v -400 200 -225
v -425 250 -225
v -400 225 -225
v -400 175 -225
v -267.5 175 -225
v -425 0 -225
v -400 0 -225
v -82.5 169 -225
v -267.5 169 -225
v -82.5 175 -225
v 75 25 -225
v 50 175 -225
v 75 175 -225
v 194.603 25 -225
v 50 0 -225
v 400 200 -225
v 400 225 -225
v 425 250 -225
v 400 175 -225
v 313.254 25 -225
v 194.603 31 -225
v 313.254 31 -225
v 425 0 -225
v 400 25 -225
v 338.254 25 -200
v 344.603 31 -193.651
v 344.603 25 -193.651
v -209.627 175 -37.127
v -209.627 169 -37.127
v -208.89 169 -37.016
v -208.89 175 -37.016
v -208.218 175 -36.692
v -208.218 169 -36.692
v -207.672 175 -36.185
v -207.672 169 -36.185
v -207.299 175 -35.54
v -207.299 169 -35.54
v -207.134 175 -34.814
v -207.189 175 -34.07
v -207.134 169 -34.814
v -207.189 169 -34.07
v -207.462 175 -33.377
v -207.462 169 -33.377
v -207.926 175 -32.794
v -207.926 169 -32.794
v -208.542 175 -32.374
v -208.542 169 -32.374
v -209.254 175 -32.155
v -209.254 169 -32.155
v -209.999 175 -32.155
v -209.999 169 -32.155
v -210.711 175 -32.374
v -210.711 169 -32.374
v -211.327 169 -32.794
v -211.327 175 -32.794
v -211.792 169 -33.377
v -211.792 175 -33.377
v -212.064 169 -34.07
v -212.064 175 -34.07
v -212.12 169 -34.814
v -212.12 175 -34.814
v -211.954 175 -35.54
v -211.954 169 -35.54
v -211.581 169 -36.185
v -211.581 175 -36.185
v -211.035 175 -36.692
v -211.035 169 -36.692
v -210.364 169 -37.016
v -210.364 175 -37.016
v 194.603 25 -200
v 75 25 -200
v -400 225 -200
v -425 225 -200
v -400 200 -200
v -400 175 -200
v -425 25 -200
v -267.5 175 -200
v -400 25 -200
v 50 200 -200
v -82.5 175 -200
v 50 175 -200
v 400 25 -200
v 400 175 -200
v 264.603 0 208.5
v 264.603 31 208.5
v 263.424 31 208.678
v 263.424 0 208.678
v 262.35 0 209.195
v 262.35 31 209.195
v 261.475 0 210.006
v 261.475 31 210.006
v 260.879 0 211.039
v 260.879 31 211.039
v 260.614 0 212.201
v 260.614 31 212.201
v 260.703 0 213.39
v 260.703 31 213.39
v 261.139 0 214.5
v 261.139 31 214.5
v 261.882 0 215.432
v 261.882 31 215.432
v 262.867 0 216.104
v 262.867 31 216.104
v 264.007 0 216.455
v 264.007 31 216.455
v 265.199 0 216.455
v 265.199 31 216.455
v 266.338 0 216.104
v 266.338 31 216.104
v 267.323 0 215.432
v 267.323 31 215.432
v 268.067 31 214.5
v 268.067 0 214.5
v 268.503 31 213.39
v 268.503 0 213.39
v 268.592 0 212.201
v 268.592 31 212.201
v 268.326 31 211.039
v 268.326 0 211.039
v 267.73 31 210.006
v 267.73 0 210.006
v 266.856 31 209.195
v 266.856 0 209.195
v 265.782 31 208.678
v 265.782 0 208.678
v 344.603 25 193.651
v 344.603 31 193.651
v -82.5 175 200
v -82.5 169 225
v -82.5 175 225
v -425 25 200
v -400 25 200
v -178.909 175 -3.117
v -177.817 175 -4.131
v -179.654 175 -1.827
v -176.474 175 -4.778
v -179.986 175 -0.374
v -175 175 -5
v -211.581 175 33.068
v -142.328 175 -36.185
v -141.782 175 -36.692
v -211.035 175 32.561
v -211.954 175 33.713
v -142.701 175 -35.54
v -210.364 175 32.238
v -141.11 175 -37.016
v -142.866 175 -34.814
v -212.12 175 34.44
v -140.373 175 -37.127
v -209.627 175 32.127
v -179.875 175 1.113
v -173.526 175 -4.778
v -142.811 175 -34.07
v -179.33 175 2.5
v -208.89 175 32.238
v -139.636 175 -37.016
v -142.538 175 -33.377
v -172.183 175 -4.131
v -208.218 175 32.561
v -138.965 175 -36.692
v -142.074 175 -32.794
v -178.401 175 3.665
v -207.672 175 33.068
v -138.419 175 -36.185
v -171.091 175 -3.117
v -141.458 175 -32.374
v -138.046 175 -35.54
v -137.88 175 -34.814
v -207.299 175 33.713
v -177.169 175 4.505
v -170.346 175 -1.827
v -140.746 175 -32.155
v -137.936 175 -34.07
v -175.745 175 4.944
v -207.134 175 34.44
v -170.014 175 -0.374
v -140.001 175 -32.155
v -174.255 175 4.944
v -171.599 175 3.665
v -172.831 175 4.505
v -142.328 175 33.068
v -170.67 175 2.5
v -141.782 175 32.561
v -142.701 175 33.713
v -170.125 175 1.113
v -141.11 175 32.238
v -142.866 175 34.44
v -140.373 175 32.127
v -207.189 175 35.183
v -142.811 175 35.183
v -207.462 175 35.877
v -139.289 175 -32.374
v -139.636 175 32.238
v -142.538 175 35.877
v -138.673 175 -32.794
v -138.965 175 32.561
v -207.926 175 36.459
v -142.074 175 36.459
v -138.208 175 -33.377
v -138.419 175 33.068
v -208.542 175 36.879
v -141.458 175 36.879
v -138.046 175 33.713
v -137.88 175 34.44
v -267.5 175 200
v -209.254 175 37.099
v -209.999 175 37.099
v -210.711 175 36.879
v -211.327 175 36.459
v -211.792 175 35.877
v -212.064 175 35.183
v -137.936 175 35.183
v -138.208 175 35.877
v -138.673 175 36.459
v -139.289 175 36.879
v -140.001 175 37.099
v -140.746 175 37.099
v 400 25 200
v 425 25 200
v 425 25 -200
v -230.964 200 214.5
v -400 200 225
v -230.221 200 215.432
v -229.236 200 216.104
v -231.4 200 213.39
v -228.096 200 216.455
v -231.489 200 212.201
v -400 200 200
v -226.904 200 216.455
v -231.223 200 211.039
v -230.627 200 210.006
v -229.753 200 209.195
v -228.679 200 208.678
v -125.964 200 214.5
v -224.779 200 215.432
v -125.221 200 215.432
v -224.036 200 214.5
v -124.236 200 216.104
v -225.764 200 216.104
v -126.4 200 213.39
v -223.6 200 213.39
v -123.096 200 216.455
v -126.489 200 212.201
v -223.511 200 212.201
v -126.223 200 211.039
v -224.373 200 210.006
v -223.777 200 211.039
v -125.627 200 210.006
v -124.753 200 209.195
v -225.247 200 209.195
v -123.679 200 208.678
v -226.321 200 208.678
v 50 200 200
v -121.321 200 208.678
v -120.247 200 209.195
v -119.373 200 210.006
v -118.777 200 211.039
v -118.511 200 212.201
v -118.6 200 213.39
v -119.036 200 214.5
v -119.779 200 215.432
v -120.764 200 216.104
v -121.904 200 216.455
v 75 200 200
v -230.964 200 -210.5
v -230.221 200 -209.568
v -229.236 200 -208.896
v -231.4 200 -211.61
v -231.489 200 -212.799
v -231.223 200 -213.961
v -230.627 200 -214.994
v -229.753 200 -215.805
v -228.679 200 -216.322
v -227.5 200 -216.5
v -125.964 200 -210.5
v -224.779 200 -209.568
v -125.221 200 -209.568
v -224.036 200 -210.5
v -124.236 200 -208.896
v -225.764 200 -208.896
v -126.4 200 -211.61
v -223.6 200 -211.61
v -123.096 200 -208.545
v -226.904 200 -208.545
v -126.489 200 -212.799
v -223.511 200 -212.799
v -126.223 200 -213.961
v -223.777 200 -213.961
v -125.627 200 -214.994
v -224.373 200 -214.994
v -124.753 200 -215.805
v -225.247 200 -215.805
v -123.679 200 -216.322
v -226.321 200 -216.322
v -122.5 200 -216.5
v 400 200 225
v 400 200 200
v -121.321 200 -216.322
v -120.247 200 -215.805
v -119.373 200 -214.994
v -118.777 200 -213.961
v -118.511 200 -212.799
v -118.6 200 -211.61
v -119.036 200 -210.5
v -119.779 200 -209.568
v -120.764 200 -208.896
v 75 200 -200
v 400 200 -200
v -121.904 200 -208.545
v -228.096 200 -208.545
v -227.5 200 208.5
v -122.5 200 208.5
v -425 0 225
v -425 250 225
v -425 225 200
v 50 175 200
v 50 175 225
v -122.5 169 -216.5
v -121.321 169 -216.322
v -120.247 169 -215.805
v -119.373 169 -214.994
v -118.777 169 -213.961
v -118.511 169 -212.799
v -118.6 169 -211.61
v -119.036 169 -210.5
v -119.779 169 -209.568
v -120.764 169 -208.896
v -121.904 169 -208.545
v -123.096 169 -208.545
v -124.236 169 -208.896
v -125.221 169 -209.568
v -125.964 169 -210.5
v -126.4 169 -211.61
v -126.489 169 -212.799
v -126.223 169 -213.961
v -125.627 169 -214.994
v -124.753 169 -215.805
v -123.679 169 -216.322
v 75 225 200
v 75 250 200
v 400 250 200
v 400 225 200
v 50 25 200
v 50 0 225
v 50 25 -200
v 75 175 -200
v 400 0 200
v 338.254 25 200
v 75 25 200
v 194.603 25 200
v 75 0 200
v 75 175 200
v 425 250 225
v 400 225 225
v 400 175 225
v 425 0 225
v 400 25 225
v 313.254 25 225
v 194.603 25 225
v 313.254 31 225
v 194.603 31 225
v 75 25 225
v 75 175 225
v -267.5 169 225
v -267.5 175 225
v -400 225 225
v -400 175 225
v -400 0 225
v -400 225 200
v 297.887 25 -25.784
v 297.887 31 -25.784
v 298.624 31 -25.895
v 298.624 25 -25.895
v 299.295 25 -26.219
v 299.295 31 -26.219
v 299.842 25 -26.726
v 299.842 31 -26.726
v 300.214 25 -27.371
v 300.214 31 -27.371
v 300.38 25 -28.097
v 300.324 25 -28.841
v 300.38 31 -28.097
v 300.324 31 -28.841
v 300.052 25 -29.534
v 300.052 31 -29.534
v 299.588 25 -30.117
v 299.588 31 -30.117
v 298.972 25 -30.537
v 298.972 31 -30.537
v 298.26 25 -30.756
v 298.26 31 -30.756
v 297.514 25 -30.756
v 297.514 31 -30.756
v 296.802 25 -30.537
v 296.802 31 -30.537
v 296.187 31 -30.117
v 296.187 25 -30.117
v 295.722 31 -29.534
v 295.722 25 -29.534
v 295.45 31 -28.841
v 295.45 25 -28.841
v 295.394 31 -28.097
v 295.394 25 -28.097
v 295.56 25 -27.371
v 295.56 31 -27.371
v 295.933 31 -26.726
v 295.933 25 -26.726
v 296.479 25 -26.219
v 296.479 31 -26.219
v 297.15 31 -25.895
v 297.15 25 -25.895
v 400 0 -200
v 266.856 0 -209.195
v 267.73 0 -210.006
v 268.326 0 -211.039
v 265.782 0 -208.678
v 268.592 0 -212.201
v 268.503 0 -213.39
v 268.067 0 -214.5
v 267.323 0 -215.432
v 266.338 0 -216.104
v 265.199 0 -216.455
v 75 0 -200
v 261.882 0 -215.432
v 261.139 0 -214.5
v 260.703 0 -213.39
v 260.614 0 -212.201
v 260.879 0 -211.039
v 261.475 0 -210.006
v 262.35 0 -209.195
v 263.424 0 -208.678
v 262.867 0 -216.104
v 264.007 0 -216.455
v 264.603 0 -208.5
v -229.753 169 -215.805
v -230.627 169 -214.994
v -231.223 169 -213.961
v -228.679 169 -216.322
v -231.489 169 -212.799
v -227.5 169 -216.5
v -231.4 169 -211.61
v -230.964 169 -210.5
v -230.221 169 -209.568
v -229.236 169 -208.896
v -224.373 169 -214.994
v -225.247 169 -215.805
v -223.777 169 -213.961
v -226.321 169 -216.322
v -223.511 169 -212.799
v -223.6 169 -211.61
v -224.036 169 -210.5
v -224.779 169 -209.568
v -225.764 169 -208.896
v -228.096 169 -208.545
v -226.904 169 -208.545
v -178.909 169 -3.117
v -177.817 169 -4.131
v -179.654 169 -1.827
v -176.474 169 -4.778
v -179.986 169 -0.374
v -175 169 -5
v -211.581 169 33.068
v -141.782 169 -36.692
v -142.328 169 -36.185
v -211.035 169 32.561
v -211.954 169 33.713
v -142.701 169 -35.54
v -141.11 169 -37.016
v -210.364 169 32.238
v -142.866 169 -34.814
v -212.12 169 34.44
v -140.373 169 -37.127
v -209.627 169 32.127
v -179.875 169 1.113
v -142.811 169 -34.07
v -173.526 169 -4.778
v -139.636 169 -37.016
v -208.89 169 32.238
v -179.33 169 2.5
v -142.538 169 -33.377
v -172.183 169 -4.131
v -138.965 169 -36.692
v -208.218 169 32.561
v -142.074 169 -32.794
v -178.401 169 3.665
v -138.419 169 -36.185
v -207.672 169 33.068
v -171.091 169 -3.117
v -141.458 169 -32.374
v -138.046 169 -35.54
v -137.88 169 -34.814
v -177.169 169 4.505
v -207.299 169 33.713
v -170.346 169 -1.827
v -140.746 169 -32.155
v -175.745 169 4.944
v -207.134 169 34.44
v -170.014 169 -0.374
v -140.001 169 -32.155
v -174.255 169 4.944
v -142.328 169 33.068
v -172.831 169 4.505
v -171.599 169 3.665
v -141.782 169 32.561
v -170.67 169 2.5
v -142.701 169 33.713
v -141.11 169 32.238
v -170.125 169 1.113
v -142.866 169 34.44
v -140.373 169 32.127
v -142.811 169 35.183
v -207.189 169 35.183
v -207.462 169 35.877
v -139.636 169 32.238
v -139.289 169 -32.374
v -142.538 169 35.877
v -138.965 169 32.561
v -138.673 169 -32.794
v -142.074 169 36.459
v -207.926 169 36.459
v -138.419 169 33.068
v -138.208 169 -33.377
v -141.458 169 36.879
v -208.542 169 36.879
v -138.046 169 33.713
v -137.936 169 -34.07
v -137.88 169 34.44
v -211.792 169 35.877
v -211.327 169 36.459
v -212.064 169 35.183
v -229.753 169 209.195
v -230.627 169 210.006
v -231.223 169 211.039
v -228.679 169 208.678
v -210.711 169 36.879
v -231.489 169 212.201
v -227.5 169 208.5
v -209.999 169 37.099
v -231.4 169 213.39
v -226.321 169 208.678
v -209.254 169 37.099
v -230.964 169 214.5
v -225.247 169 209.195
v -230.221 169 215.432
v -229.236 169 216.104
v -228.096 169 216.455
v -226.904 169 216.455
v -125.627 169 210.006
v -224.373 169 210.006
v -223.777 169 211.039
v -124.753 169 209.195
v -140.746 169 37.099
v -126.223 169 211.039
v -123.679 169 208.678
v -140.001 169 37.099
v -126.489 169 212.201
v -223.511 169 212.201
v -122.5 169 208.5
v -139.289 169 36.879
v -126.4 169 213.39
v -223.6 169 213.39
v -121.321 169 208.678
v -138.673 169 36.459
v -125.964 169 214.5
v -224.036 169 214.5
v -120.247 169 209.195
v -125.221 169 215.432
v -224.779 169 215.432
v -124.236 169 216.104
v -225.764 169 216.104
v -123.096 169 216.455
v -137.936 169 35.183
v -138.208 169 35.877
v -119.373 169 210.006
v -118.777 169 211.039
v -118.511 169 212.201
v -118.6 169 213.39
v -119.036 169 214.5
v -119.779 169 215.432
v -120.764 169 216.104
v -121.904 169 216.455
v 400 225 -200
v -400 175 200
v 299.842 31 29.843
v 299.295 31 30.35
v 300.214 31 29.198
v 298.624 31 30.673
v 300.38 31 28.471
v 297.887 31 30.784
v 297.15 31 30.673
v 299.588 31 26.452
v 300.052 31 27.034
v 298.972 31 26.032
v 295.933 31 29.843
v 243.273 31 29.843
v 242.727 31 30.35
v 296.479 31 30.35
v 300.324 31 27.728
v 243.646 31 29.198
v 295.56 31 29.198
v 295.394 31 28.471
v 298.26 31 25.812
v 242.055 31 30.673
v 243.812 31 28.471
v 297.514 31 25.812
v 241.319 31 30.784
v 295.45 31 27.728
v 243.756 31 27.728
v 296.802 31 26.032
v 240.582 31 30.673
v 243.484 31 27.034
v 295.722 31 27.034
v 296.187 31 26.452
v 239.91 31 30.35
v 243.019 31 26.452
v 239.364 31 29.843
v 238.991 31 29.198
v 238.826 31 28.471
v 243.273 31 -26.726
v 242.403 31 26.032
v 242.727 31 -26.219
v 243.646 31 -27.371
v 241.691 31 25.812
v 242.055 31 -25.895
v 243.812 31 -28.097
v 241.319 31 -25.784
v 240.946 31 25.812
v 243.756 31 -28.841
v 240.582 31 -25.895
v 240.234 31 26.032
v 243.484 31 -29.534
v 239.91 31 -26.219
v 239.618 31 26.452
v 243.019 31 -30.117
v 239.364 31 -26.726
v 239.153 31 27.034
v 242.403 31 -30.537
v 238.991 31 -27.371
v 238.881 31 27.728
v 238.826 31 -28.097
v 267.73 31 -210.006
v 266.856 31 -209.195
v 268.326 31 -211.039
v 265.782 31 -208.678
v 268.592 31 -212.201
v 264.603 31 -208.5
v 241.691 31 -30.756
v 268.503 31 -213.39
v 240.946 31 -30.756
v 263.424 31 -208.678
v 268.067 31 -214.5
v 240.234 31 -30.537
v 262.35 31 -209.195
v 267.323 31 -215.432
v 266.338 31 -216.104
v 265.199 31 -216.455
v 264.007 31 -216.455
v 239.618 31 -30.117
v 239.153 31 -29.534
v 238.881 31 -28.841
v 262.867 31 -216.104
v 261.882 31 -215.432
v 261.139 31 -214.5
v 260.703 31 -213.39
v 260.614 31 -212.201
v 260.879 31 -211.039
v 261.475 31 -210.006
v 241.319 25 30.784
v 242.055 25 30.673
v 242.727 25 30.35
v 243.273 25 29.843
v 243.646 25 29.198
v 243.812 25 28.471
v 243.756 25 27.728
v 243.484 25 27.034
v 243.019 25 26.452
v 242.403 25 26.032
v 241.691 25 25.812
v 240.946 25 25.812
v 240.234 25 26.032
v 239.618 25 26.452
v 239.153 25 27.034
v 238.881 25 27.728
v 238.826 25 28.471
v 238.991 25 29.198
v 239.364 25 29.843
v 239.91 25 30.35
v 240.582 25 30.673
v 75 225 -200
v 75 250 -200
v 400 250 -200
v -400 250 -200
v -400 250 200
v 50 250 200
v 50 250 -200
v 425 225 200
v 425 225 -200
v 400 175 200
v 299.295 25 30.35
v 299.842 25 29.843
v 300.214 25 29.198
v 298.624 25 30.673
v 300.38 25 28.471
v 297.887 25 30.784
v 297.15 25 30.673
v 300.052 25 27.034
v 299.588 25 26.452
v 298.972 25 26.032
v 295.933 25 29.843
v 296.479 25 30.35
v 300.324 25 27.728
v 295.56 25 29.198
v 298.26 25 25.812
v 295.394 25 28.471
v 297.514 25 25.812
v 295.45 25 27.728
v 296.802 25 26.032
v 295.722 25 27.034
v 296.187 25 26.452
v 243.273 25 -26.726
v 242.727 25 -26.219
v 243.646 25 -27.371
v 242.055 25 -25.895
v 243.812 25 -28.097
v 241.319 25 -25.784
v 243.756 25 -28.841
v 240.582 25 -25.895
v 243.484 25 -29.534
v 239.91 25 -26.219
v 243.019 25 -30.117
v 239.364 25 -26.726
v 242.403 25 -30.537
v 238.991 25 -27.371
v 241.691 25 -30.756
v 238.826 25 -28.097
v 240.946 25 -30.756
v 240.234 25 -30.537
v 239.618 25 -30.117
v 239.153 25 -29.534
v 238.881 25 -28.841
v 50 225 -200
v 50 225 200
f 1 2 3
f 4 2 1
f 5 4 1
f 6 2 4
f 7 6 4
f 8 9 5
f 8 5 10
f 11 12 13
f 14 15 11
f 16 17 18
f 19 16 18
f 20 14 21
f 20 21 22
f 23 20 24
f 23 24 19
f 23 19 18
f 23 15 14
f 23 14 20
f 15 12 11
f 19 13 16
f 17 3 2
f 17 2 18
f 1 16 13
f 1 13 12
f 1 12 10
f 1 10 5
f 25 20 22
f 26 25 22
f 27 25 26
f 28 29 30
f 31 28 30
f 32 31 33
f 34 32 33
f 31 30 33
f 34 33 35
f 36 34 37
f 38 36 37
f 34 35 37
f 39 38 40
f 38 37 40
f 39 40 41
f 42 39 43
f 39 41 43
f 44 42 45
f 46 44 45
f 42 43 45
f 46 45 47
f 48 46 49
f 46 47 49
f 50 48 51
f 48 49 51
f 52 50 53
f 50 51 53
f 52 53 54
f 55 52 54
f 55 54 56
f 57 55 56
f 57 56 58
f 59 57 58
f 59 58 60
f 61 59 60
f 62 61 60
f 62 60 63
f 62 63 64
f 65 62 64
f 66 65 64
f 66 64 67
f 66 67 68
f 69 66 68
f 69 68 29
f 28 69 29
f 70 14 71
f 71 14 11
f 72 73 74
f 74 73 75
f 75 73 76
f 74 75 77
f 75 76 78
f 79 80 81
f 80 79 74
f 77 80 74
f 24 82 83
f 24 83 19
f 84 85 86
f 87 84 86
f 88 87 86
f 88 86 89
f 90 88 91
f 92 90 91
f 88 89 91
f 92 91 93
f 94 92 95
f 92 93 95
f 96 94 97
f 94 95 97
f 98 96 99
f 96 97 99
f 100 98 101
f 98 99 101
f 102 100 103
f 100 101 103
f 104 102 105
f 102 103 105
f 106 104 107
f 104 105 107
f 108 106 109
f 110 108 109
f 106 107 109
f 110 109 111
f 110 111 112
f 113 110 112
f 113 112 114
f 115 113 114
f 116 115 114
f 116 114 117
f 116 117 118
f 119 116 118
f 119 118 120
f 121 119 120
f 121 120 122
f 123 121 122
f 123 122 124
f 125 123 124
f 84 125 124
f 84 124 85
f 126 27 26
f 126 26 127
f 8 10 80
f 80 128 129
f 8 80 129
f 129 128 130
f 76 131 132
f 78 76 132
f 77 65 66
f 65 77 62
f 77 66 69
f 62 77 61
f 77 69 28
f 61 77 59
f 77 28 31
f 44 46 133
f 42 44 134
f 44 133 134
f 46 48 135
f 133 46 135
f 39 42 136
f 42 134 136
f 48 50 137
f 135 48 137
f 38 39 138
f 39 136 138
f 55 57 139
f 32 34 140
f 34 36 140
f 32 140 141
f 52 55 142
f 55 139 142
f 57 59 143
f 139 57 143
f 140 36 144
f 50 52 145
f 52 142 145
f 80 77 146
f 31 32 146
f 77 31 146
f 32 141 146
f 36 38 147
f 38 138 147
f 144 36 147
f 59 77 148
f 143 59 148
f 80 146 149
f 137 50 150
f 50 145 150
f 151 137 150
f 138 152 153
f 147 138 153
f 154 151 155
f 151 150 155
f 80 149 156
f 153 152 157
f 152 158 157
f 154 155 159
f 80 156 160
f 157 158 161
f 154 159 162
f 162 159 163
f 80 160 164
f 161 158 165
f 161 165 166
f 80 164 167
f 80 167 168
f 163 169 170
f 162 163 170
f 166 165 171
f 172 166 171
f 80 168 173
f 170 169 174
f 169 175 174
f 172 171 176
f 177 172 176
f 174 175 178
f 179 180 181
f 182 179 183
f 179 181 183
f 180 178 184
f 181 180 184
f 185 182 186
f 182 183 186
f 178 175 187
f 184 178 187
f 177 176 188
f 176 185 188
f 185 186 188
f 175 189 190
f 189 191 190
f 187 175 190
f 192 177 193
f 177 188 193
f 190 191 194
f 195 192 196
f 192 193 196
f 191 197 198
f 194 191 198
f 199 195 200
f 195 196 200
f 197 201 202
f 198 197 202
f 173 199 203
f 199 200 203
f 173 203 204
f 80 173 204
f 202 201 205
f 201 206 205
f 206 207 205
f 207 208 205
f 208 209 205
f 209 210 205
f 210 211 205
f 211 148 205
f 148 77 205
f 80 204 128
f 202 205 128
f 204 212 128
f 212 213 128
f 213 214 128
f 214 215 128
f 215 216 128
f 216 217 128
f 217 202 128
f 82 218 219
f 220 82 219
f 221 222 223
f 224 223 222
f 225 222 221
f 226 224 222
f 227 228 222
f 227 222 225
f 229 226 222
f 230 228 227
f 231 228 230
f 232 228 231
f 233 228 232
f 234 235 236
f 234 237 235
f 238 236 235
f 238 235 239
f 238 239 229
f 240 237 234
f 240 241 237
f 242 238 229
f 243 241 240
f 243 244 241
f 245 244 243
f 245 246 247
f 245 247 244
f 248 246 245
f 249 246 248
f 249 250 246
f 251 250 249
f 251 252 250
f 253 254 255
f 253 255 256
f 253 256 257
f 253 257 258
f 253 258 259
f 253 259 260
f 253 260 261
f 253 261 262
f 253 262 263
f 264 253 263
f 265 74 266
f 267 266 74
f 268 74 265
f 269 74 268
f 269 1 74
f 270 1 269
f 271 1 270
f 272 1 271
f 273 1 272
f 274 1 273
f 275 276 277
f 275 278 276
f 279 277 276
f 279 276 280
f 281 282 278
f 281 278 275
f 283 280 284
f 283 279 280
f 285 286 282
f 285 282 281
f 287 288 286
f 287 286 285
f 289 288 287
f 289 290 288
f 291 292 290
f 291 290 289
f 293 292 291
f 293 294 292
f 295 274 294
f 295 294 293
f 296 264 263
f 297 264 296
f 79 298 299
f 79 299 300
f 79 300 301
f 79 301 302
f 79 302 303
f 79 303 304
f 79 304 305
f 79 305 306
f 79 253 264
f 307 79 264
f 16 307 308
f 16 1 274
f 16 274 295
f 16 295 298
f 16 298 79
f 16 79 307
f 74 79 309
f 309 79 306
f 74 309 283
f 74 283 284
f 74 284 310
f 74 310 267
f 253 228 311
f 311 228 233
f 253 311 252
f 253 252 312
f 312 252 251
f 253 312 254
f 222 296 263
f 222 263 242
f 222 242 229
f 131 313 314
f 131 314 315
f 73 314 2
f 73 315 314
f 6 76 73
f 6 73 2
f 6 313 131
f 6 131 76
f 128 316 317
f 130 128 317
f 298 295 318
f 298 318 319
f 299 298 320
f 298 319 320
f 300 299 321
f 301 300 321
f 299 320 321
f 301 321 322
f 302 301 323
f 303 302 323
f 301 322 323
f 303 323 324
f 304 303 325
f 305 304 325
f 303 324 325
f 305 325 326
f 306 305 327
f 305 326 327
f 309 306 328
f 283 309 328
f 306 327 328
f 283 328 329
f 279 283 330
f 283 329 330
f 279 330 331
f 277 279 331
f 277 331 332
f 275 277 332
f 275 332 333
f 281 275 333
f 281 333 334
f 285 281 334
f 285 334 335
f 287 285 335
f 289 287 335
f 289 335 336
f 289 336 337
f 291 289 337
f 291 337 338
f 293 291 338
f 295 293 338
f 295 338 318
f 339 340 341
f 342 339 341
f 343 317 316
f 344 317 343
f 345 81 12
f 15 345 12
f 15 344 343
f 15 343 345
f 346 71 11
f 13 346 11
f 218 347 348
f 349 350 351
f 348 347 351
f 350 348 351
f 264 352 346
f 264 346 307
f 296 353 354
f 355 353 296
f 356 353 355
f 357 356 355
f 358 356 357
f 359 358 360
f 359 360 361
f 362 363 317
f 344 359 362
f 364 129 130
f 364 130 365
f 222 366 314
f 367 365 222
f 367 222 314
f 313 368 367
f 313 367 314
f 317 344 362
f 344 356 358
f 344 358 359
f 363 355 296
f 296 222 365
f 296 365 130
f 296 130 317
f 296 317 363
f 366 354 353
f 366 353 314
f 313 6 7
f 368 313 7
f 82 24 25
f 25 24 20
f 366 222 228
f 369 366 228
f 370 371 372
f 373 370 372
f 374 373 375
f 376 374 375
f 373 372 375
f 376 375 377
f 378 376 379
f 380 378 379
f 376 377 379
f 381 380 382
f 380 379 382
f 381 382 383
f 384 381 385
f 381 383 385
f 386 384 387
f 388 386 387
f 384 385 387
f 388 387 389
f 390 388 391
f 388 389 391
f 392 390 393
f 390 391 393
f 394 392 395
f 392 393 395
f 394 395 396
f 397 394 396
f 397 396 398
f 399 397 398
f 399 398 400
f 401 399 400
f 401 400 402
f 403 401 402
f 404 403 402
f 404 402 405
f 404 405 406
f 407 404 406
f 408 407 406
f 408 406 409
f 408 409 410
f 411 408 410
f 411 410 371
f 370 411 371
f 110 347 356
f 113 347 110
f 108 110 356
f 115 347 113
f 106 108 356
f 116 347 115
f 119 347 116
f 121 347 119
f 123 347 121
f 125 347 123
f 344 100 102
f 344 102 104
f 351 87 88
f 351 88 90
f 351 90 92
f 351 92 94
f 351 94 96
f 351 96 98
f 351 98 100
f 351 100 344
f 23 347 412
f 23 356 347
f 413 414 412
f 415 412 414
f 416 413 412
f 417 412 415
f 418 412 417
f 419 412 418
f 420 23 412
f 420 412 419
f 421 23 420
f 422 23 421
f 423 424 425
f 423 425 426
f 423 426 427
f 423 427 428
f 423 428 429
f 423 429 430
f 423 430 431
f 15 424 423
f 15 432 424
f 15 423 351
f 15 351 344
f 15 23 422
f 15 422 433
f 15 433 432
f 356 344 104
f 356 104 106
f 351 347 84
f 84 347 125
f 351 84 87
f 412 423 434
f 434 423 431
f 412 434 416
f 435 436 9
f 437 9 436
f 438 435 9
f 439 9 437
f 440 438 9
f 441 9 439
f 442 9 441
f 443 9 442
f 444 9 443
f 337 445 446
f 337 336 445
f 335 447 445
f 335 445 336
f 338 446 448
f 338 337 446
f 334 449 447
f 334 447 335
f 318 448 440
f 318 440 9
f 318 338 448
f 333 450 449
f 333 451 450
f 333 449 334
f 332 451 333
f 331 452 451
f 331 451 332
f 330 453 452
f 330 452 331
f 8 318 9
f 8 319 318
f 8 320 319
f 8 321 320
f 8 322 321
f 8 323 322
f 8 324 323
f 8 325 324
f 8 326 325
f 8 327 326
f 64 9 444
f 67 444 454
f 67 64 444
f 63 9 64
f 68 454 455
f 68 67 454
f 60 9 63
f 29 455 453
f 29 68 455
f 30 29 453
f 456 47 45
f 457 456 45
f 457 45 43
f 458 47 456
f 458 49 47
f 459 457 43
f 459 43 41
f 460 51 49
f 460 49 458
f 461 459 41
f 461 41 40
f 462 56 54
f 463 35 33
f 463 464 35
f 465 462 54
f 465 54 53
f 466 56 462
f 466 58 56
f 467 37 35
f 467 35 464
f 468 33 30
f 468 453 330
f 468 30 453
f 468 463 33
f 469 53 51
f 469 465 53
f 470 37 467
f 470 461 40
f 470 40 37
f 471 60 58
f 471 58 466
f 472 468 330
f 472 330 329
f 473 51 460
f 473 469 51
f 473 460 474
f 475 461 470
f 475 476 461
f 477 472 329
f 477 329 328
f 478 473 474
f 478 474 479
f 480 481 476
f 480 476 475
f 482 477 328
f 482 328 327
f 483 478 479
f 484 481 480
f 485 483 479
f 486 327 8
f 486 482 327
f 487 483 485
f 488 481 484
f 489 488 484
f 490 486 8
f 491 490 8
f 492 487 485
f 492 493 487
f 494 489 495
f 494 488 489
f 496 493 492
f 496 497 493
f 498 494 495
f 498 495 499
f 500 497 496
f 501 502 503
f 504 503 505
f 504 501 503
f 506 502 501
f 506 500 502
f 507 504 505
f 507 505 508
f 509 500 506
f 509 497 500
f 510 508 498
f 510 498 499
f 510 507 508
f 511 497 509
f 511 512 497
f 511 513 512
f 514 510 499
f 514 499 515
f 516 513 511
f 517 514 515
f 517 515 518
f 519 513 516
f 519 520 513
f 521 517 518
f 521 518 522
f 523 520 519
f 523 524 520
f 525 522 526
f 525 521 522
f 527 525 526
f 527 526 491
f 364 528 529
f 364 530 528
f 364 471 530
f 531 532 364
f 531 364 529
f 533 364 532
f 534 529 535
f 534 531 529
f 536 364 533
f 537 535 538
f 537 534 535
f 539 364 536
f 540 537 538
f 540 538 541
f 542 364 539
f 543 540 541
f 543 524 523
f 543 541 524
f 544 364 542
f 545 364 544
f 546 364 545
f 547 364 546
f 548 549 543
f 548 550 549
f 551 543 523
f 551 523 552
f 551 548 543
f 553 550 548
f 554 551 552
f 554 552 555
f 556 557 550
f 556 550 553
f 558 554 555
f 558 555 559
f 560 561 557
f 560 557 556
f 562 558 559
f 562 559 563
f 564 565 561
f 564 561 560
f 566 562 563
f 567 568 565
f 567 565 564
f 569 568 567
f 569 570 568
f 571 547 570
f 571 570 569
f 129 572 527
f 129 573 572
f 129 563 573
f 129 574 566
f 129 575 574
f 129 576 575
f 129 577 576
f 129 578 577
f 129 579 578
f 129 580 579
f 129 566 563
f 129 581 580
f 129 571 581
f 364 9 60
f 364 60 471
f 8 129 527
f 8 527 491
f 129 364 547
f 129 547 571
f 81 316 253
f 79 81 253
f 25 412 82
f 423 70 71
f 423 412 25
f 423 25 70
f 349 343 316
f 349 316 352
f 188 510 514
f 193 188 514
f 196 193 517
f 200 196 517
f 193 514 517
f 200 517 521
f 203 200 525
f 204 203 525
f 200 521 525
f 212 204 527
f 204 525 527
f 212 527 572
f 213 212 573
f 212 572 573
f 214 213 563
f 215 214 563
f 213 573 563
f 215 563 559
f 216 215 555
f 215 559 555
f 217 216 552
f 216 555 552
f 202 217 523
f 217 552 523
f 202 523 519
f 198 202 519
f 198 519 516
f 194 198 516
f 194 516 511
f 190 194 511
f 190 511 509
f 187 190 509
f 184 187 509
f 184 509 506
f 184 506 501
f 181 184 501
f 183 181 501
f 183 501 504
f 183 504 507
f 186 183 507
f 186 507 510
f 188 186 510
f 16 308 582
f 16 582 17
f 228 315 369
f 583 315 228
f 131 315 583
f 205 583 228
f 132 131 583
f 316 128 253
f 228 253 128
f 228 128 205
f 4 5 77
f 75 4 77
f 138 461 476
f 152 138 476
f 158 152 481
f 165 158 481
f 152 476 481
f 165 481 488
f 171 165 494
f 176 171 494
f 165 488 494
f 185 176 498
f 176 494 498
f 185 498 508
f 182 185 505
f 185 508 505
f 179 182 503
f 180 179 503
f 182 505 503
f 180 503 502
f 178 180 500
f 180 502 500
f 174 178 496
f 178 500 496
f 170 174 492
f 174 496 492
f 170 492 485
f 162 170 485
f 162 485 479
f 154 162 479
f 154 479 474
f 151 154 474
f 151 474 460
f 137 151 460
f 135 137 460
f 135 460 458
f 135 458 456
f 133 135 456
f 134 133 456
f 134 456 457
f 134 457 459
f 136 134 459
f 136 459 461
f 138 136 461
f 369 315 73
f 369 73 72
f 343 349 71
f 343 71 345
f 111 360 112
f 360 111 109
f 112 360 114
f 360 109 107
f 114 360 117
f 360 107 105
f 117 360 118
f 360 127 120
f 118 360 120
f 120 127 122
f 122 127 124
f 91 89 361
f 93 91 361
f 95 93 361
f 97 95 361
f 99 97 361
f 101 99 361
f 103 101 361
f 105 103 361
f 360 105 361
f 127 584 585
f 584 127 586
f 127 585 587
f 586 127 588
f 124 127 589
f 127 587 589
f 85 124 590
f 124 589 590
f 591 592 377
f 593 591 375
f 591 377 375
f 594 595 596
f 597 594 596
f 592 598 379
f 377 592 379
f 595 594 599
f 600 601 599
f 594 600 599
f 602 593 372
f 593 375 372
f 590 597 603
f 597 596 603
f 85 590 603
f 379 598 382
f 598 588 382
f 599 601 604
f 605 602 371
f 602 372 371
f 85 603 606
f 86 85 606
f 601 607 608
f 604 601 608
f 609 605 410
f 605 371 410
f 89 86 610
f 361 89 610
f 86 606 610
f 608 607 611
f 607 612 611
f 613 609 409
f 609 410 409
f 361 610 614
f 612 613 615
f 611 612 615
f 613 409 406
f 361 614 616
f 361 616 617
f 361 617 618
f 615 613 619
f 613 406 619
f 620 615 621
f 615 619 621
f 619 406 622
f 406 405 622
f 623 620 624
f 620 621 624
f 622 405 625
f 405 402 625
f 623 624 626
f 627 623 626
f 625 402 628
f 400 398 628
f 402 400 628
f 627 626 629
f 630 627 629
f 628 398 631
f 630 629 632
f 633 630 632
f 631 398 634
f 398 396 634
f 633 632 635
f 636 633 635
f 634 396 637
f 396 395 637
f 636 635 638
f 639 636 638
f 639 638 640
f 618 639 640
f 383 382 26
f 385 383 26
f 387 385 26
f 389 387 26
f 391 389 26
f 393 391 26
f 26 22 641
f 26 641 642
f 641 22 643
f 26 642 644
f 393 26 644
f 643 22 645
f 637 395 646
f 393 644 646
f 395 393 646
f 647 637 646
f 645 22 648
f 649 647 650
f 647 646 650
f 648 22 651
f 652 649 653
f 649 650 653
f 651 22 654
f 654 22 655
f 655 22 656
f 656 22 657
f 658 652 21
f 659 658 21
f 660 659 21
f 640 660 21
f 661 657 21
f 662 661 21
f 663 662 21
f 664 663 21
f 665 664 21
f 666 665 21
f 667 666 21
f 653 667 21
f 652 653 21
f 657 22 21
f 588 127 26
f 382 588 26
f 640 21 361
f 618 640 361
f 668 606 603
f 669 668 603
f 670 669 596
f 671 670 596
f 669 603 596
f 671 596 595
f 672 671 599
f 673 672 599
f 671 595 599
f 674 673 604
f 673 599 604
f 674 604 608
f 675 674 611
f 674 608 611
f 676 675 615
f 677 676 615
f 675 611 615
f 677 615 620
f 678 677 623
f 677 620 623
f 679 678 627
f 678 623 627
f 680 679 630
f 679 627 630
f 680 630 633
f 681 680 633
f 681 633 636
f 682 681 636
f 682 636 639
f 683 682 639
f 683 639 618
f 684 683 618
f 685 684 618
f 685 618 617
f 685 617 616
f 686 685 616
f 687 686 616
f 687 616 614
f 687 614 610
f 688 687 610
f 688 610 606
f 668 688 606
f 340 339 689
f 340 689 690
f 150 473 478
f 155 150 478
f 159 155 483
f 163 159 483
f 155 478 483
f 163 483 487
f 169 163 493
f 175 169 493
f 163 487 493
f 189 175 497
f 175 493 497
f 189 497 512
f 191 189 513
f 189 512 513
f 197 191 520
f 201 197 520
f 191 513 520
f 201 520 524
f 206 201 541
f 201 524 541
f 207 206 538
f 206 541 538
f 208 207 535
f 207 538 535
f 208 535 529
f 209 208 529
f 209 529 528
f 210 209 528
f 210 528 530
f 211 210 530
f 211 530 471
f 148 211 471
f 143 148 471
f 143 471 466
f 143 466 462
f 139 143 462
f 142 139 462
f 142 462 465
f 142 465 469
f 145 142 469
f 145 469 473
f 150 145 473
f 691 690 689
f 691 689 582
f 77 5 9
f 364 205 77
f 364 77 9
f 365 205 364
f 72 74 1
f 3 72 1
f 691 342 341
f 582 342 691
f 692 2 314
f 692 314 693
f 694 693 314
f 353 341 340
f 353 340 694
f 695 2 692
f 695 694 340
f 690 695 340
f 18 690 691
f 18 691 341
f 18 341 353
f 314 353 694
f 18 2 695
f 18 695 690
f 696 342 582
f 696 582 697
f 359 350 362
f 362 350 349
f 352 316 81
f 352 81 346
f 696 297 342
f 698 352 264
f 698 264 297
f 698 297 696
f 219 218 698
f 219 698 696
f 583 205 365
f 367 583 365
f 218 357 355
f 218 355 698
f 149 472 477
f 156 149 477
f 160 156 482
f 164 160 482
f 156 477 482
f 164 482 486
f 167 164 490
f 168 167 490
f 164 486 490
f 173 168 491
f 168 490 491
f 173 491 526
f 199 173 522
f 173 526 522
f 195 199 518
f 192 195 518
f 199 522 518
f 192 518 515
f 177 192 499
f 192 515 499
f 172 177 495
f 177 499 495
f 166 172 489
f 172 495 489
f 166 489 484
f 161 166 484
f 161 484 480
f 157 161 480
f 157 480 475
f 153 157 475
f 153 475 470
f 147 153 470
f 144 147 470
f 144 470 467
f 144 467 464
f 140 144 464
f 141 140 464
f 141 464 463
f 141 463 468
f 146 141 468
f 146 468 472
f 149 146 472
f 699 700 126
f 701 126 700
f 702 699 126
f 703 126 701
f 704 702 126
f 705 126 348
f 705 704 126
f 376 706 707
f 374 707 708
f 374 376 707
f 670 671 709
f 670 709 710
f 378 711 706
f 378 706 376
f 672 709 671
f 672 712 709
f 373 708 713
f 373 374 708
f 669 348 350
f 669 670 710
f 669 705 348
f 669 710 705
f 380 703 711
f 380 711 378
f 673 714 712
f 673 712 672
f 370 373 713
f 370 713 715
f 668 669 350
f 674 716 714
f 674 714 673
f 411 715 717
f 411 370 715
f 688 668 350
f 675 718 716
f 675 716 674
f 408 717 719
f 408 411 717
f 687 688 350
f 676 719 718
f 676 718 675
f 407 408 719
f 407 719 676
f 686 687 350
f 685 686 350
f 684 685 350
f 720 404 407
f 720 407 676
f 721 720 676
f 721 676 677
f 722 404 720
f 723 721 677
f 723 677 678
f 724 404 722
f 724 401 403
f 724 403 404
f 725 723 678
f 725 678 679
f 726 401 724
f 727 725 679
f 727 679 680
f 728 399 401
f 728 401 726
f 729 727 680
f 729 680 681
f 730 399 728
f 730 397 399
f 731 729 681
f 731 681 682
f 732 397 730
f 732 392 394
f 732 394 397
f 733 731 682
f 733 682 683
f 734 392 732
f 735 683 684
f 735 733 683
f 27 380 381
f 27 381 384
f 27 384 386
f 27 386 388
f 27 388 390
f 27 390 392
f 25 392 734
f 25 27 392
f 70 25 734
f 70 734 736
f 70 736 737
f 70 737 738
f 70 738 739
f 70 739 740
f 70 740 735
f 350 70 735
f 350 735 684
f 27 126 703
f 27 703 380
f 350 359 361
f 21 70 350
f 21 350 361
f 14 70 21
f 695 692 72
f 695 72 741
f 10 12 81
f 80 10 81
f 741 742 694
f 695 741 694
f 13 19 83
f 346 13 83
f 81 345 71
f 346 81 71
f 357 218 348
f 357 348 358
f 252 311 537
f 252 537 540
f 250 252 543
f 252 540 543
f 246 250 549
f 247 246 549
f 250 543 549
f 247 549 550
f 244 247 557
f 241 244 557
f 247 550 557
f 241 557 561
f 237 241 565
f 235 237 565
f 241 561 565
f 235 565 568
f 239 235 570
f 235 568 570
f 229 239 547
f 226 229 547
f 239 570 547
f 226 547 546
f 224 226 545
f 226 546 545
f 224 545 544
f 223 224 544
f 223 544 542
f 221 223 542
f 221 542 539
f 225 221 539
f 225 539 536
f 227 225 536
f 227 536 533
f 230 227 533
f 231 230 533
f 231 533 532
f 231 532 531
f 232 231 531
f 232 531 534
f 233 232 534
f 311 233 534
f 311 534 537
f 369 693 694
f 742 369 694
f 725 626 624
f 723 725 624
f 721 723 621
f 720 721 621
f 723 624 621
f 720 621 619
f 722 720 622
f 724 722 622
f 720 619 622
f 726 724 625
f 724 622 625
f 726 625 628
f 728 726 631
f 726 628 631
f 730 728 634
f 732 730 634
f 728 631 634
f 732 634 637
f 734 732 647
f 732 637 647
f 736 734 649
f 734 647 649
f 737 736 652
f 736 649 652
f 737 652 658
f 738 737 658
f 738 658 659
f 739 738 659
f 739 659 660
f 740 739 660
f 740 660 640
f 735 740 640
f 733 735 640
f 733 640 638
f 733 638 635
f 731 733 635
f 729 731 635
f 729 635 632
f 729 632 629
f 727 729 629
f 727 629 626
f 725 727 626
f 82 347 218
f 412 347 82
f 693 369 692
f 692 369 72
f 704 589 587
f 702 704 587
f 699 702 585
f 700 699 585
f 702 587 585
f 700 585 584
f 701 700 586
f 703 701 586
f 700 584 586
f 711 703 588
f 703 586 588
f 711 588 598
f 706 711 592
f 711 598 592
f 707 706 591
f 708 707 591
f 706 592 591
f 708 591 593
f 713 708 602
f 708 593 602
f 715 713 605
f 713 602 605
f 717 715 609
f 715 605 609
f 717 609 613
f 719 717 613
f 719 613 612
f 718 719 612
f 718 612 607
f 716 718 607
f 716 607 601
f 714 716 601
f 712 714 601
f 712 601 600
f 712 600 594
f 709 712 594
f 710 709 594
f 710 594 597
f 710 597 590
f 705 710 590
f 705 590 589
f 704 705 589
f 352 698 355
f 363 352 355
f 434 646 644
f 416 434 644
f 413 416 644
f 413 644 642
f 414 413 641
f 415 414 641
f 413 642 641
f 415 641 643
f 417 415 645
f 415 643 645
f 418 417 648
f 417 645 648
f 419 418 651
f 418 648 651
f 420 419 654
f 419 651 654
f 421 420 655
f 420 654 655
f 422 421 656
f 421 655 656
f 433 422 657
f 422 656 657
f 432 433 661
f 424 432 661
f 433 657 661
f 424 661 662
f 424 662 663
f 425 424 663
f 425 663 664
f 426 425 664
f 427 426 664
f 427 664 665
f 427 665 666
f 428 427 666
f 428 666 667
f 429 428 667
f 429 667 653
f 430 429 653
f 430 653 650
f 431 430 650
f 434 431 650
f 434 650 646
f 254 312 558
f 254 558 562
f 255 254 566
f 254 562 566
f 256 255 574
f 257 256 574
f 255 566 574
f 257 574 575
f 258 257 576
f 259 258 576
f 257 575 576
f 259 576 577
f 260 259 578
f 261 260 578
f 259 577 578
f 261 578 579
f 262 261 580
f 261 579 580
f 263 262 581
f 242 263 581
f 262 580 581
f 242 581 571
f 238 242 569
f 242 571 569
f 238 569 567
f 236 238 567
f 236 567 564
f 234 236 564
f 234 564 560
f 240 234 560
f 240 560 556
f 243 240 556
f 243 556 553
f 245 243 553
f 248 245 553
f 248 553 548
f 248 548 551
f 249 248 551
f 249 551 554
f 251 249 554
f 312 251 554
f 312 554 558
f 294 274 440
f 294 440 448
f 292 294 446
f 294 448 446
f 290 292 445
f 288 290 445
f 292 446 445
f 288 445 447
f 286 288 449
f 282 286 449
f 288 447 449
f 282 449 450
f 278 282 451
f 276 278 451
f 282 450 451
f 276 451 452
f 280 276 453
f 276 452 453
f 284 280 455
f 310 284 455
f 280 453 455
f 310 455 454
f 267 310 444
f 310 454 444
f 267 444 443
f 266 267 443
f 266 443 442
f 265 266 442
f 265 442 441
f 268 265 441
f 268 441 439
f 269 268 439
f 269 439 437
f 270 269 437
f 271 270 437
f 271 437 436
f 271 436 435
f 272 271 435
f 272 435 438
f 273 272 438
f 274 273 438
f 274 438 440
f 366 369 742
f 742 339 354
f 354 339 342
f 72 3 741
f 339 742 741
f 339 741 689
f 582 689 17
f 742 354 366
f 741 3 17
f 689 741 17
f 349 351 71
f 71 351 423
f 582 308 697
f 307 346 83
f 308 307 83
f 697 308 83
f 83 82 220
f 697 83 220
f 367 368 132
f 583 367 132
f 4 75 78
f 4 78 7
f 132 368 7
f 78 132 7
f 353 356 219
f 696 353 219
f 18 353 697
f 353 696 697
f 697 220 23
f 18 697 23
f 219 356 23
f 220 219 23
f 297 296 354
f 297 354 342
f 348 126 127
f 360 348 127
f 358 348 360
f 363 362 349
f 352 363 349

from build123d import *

# Parameters (mm, degrees)
SKETCH1_W             = 25
SKETCH1_H             = 450
BOSS_EXTRUDE2_DEPTH   = 25
BOSS_EXTRUDE2_2_DEPTH = 25
SKETCH2_W             = 25
SKETCH2_H             = 25
BOSS_EXTRUDE3_DEPTH   = 200
SKETCH3_W             = 25
SKETCH3_H             = 450
BOSS_EXTRUDE4_DEPTH   = 25
SKETCH5_W             = 25
SKETCH5_H             = 25
BOSS_EXTRUDE5_DEPTH   = 200
SKETCH6_W             = 25
SKETCH6_H             = 450
BOSS_EXTRUDE6_DEPTH   = 25
SKETCH7_W             = 800
SKETCH7_H             = 25
BOSS_EXTRUDE7_DEPTH   = 25
SKETCH8_W             = 350
SKETCH8_H             = 25
BOSS_EXTRUDE8_DEPTH   = 25
SKETCH9_W             = 25
SKETCH9_H             = 425
BOSS_EXTRUDE9_DEPTH   = 25
SKETCH10_W            = 25
SKETCH10_H            = 25
BOSS_EXTRUDE10_DEPTH  = 800
BOSS_EXTRUDE13_REACH  = 532.919
SKETCH14_W            = 25
SKETCH14_H            = 25
SKETCH15_W            = 185
SKETCH15_H            = 450
BOSS_EXTRUDE14_DEPTH  = 6
BOSS_EXTRUDE15_DEPTH  = 6
CUT_EXTRUDE2_REACH    = 511.717
SKETCH19_R            = 4
CUT_EXTRUDE4_REACH    = 530.404
SKETCH20_R            = 4
SKETCH21_R            = 5
SKETCH21_R_2          = 2.5
CUT_EXTRUDE5_DEPTH    = 10
BOSS_EXTRUDE16_REACH  = 652.961
SKETCH24_W            = 25
SKETCH24_H            = 25
SKETCH25_R            = 2.5
CUT_EXTRUDE6_DEPTH    = 10


with BuildPart() as part:
    # Sketch1 → Boss-Extrude2 (new body)
    with BuildSketch(Plane(origin=(0, 0, 0), x_dir=(1, 0, 0), z_dir=(0, 1, 0))):
        with Locations((-412.5, 0)):
            Rectangle(SKETCH1_W, SKETCH1_H)
    extrude(amount=BOSS_EXTRUDE2_DEPTH)

    # Sketch2 → Boss-Extrude3 (add)
    with BuildSketch(Plane(origin=(0, 25, 0), x_dir=(1, 0, 0), z_dir=(0, 1, 0))):
        with Locations((-412.5, 212.5)):
            Rectangle(SKETCH2_W, SKETCH2_H)
        with Locations((-412.5, -212.5)):
            Rectangle(SKETCH2_W, SKETCH2_H)
    extrude(amount=BOSS_EXTRUDE3_DEPTH)

    # Sketch3 → Boss-Extrude4 (add)
    with BuildSketch(Plane(origin=(0, 225, 0), x_dir=(1, 0, 0), z_dir=(0, 1, 0))):
        with Locations((-412.5, 0)):
            Rectangle(SKETCH3_W, SKETCH3_H)
    extrude(amount=BOSS_EXTRUDE4_DEPTH)



with BuildPart() as body_2:
    # Sketch1 → Boss-Extrude2 2 (new body)
    with BuildSketch(Plane(origin=(0, 0, 0), x_dir=(1, 0, 0), z_dir=(0, 1, 0))):
        with Locations((412.5, 0)):
            Rectangle(SKETCH1_W, SKETCH1_H)
    extrude(amount=BOSS_EXTRUDE2_2_DEPTH)

    # Sketch5 → Boss-Extrude5 (add)
    with BuildSketch(Plane(origin=(0, 25, 0), x_dir=(1, 0, 0), z_dir=(0, 1, 0))):
        with Locations((412.5, 212.5)):
            Rectangle(SKETCH5_W, SKETCH5_H)
        with Locations((412.5, -212.5)):
            Rectangle(SKETCH5_W, SKETCH5_H)
    extrude(amount=BOSS_EXTRUDE5_DEPTH)

    # Sketch6 → Boss-Extrude6 (add)
    with BuildSketch(Plane(origin=(0, 225, 0), x_dir=(1, 0, 0), z_dir=(0, 1, 0))):
        with Locations((412.5, 0)):
            Rectangle(SKETCH6_W, SKETCH6_H)
    extrude(amount=BOSS_EXTRUDE6_DEPTH)


with BuildPart() as part_1:
    add(part.part)

    add(body_2.part)  # Boss-Extrude7 merges body 2
    # Sketch7 → Boss-Extrude7 (add)
    with BuildSketch(Plane(origin=(0, 250, 0), x_dir=(1, 0, 0), z_dir=(0, 1, 0))):
        with Locations((0, 212.5)):
            Rectangle(SKETCH7_W, SKETCH7_H)
        with Locations((0, -212.5)):
            Rectangle(SKETCH7_W, SKETCH7_H)
    extrude(amount=-BOSS_EXTRUDE7_DEPTH)

    # Sketch8 → Boss-Extrude8 (add)
    with BuildSketch(Plane(origin=(0, 0, 0), x_dir=(-1, 0, 0), z_dir=(0, -1, 0))):
        with Locations((-225, 212.5)):
            Rectangle(SKETCH8_W, SKETCH8_H)
        with Locations((-225, -212.5)):
            Rectangle(SKETCH8_W, SKETCH8_H)
    extrude(amount=-BOSS_EXTRUDE8_DEPTH)

    # Sketch9 → Boss-Extrude9 (add)
    with BuildSketch(Plane(origin=(0, 0, 0), x_dir=(-1, 0, 0), z_dir=(0, -1, 0))):
        with Locations((-62.5, -12.5)):
            Rectangle(SKETCH9_W, SKETCH9_H)
    extrude(amount=-BOSS_EXTRUDE9_DEPTH)

    # Sketch10 → Boss-Extrude10 (add)
    with BuildSketch(Plane.ZY.offset(-400)):
        with Locations((212.5, 187.5)):
            Rectangle(SKETCH10_W, SKETCH10_H)
        with Locations((-212.5, 187.5)):
            Rectangle(SKETCH10_W, SKETCH10_H)
    extrude(amount=BOSS_EXTRUDE10_DEPTH)

    # Sketch14 → Boss-Extrude13 (add, up to next)
    with BuildSketch(Plane(origin=(0, 25, 0), x_dir=(1, 0, 0), z_dir=(0, 1, 0)), mode=Mode.PRIVATE) as boss_extrude13_sk1:
        with Locations((62.5, 212.5)):
            Rectangle(SKETCH14_W, SKETCH14_H)
    boss_extrude13_tool1 = extrude(boss_extrude13_sk1.sketch, amount=BOSS_EXTRUDE13_REACH, mode=Mode.PRIVATE) - part_1.part
    # Sketch14 → Boss-Extrude13 (add, up to next)
    with BuildSketch(Plane(origin=(0, 25, 0), x_dir=(1, 0, 0), z_dir=(0, 1, 0)), mode=Mode.PRIVATE) as boss_extrude13_sk2:
        with Locations((62.5, -212.5)):
            Rectangle(SKETCH14_W, SKETCH14_H)
    boss_extrude13_tool2 = extrude(boss_extrude13_sk2.sketch, amount=BOSS_EXTRUDE13_REACH, mode=Mode.PRIVATE) - part_1.part
    add(boss_extrude13_tool1.solids().sort_by_distance((62.5, 25, -212.5))[0])
    add(boss_extrude13_tool2.solids().sort_by_distance((62.5, 25, 212.5))[0])

    # Sketch15 → Boss-Extrude14 (add)
    with BuildSketch(Plane.XZ.offset(-175)):
        with Locations((-175, 0)):
            Rectangle(SKETCH15_W, SKETCH15_H)
    extrude(amount=BOSS_EXTRUDE14_DEPTH)

    # Sketch18 → Boss-Extrude15 (add)
    with BuildSketch(Plane(origin=(0, 25, 0), x_dir=(1, 0, 0), z_dir=(0, 1, 0))):
        Polygon((194.602808883, 225), (313.254235522, 225), (344.602808883, 193.65142664), (344.602808883, -193.65142664), (313.254235522, -225), (194.602808883, -225), align=None)
    extrude(amount=BOSS_EXTRUDE15_DEPTH)

    # Sketch19 → Cut-Extrude2 (cut, up to next)
    with BuildSketch(Plane.XZ.offset(-169), mode=Mode.PRIVATE) as cut_extrude2_sk1:
        with Locations(Location((-227.5, 212.5, 0), (0, 0, 270))):
            Circle(SKETCH19_R)
    cut_extrude2_tool1 = extrude(cut_extrude2_sk1.sketch, amount=-CUT_EXTRUDE2_REACH, mode=Mode.PRIVATE) & part_1.part
    # Sketch19 → Cut-Extrude2 (cut, up to next)
    with BuildSketch(Plane.XZ.offset(-169), mode=Mode.PRIVATE) as cut_extrude2_sk2:
        with Locations(Location((-122.5, 212.5, 0), (0, 0, 270))):
            Circle(SKETCH19_R)
    cut_extrude2_tool2 = extrude(cut_extrude2_sk2.sketch, amount=-CUT_EXTRUDE2_REACH, mode=Mode.PRIVATE) & part_1.part
    # Sketch19 → Cut-Extrude2 (cut, up to next)
    with BuildSketch(Plane.XZ.offset(-169), mode=Mode.PRIVATE) as cut_extrude2_sk3:
        with Locations(Location((-227.5, -212.5, 0), (0, 0, 270))):
            Circle(SKETCH19_R)
    cut_extrude2_tool3 = extrude(cut_extrude2_sk3.sketch, amount=-CUT_EXTRUDE2_REACH, mode=Mode.PRIVATE) & part_1.part
    # Sketch19 → Cut-Extrude2 (cut, up to next)
    with BuildSketch(Plane.XZ.offset(-169), mode=Mode.PRIVATE) as cut_extrude2_sk4:
        with Locations(Location((-122.5, -212.5, 0), (0, 0, 270))):
            Circle(SKETCH19_R)
    cut_extrude2_tool4 = extrude(cut_extrude2_sk4.sketch, amount=-CUT_EXTRUDE2_REACH, mode=Mode.PRIVATE) & part_1.part
    add(cut_extrude2_tool1.solids().sort_by_distance((-227.5, 169, 212.5))[0], mode=Mode.SUBTRACT)
    add(cut_extrude2_tool2.solids().sort_by_distance((-122.5, 169, 212.5))[0], mode=Mode.SUBTRACT)
    add(cut_extrude2_tool3.solids().sort_by_distance((-227.5, 169, -212.5))[0], mode=Mode.SUBTRACT)
    add(cut_extrude2_tool4.solids().sort_by_distance((-122.5, 169, -212.5))[0], mode=Mode.SUBTRACT)

    # Sketch20 → Cut-Extrude4 (cut, up to next)
    with BuildSketch(Plane(origin=(0, 31, 0), x_dir=(1, 0, 0), z_dir=(0, 1, 0)), mode=Mode.PRIVATE) as cut_extrude4_sk1:
        with Locations(Location((264.602808883, 212.5, 0), (0, 0, 270))):
            Circle(SKETCH20_R)
    cut_extrude4_tool1 = extrude(cut_extrude4_sk1.sketch, amount=-CUT_EXTRUDE4_REACH, mode=Mode.PRIVATE) & part_1.part
    # Sketch20 → Cut-Extrude4 (cut, up to next)
    with BuildSketch(Plane(origin=(0, 31, 0), x_dir=(1, 0, 0), z_dir=(0, 1, 0)), mode=Mode.PRIVATE) as cut_extrude4_sk2:
        with Locations(Location((264.602808883, -212.5, 0), (0, 0, 90))):
            Circle(SKETCH20_R)
    cut_extrude4_tool2 = extrude(cut_extrude4_sk2.sketch, amount=-CUT_EXTRUDE4_REACH, mode=Mode.PRIVATE) & part_1.part
    add(cut_extrude4_tool1.solids().sort_by_distance((264.602809, 31, -212.5))[0], mode=Mode.SUBTRACT)
    add(cut_extrude4_tool2.solids().sort_by_distance((264.602809, 31, 212.5))[0], mode=Mode.SUBTRACT)

    # Sketch21 → Cut-Extrude5 (cut)
    with BuildSketch(Plane.XZ.offset(-169)):
        with Locations(Location((-175, 0, 0), (0, 0, 270))):
            Circle(SKETCH21_R)
        with Locations(Location((-209.626678733, 34.626678733, 0), (0, 0, 270))):
            Circle(SKETCH21_R_2)
        with Locations(Location((-140.373321267, 34.626678733, 0), (0, 0, 270))):
            Circle(SKETCH21_R_2)
        with Locations(Location((-140.373321267, -34.626678733, 0), (0, 0, 270))):
            Circle(SKETCH21_R_2)
        with Locations(Location((-209.626678733, -34.626678733, 0), (0, 0, 270))):
            Circle(SKETCH21_R_2)
    extrude(amount=-CUT_EXTRUDE5_DEPTH, mode=Mode.SUBTRACT)

    # Sketch24 → Boss-Extrude16 (add, up to next)
    with BuildSketch(Plane.XY.offset(-200), mode=Mode.PRIVATE) as boss_extrude16_sk1:
        with Locations((62.5, 187.5)):
            Rectangle(SKETCH24_W, SKETCH24_H)
    boss_extrude16_tool1 = extrude(boss_extrude16_sk1.sketch, amount=BOSS_EXTRUDE16_REACH, mode=Mode.PRIVATE) - part_1.part
    # Sketch24 → Boss-Extrude16 (add, up to next)
    with BuildSketch(Plane.XY.offset(-200), mode=Mode.PRIVATE) as boss_extrude16_sk2:
        with Locations((62.5, 237.5)):
            Rectangle(SKETCH24_W, SKETCH24_H)
    boss_extrude16_tool2 = extrude(boss_extrude16_sk2.sketch, amount=BOSS_EXTRUDE16_REACH, mode=Mode.PRIVATE) - part_1.part
    add(boss_extrude16_tool1.solids().sort_by_distance((62.5, 187.5, -200))[0])
    add(boss_extrude16_tool2.solids().sort_by_distance((62.5, 237.5, -200))[0])

    # Sketch25 → Cut-Extrude6 (cut)
    with BuildSketch(Plane(origin=(0, 31, 0), x_dir=(1, 0, 0), z_dir=(0, 1, 0))):
        with Locations(Location((241.318537635, 28.284271247, 0), (0, 0, 270))):
            Circle(SKETCH25_R)
        with Locations(Location((297.88708013, 28.284271247, 0), (0, 0, 270))):
            Circle(SKETCH25_R)
        with Locations(Location((297.88708013, -28.284271247, 0), (0, 0, 270))):
            Circle(SKETCH25_R)
        with Locations(Location((241.318537635, -28.284271247, 0), (0, 0, 270))):
            Circle(SKETCH25_R)
    extrude(amount=-CUT_EXTRUDE6_DEPTH, mode=Mode.SUBTRACT)


solid = part_1.part
